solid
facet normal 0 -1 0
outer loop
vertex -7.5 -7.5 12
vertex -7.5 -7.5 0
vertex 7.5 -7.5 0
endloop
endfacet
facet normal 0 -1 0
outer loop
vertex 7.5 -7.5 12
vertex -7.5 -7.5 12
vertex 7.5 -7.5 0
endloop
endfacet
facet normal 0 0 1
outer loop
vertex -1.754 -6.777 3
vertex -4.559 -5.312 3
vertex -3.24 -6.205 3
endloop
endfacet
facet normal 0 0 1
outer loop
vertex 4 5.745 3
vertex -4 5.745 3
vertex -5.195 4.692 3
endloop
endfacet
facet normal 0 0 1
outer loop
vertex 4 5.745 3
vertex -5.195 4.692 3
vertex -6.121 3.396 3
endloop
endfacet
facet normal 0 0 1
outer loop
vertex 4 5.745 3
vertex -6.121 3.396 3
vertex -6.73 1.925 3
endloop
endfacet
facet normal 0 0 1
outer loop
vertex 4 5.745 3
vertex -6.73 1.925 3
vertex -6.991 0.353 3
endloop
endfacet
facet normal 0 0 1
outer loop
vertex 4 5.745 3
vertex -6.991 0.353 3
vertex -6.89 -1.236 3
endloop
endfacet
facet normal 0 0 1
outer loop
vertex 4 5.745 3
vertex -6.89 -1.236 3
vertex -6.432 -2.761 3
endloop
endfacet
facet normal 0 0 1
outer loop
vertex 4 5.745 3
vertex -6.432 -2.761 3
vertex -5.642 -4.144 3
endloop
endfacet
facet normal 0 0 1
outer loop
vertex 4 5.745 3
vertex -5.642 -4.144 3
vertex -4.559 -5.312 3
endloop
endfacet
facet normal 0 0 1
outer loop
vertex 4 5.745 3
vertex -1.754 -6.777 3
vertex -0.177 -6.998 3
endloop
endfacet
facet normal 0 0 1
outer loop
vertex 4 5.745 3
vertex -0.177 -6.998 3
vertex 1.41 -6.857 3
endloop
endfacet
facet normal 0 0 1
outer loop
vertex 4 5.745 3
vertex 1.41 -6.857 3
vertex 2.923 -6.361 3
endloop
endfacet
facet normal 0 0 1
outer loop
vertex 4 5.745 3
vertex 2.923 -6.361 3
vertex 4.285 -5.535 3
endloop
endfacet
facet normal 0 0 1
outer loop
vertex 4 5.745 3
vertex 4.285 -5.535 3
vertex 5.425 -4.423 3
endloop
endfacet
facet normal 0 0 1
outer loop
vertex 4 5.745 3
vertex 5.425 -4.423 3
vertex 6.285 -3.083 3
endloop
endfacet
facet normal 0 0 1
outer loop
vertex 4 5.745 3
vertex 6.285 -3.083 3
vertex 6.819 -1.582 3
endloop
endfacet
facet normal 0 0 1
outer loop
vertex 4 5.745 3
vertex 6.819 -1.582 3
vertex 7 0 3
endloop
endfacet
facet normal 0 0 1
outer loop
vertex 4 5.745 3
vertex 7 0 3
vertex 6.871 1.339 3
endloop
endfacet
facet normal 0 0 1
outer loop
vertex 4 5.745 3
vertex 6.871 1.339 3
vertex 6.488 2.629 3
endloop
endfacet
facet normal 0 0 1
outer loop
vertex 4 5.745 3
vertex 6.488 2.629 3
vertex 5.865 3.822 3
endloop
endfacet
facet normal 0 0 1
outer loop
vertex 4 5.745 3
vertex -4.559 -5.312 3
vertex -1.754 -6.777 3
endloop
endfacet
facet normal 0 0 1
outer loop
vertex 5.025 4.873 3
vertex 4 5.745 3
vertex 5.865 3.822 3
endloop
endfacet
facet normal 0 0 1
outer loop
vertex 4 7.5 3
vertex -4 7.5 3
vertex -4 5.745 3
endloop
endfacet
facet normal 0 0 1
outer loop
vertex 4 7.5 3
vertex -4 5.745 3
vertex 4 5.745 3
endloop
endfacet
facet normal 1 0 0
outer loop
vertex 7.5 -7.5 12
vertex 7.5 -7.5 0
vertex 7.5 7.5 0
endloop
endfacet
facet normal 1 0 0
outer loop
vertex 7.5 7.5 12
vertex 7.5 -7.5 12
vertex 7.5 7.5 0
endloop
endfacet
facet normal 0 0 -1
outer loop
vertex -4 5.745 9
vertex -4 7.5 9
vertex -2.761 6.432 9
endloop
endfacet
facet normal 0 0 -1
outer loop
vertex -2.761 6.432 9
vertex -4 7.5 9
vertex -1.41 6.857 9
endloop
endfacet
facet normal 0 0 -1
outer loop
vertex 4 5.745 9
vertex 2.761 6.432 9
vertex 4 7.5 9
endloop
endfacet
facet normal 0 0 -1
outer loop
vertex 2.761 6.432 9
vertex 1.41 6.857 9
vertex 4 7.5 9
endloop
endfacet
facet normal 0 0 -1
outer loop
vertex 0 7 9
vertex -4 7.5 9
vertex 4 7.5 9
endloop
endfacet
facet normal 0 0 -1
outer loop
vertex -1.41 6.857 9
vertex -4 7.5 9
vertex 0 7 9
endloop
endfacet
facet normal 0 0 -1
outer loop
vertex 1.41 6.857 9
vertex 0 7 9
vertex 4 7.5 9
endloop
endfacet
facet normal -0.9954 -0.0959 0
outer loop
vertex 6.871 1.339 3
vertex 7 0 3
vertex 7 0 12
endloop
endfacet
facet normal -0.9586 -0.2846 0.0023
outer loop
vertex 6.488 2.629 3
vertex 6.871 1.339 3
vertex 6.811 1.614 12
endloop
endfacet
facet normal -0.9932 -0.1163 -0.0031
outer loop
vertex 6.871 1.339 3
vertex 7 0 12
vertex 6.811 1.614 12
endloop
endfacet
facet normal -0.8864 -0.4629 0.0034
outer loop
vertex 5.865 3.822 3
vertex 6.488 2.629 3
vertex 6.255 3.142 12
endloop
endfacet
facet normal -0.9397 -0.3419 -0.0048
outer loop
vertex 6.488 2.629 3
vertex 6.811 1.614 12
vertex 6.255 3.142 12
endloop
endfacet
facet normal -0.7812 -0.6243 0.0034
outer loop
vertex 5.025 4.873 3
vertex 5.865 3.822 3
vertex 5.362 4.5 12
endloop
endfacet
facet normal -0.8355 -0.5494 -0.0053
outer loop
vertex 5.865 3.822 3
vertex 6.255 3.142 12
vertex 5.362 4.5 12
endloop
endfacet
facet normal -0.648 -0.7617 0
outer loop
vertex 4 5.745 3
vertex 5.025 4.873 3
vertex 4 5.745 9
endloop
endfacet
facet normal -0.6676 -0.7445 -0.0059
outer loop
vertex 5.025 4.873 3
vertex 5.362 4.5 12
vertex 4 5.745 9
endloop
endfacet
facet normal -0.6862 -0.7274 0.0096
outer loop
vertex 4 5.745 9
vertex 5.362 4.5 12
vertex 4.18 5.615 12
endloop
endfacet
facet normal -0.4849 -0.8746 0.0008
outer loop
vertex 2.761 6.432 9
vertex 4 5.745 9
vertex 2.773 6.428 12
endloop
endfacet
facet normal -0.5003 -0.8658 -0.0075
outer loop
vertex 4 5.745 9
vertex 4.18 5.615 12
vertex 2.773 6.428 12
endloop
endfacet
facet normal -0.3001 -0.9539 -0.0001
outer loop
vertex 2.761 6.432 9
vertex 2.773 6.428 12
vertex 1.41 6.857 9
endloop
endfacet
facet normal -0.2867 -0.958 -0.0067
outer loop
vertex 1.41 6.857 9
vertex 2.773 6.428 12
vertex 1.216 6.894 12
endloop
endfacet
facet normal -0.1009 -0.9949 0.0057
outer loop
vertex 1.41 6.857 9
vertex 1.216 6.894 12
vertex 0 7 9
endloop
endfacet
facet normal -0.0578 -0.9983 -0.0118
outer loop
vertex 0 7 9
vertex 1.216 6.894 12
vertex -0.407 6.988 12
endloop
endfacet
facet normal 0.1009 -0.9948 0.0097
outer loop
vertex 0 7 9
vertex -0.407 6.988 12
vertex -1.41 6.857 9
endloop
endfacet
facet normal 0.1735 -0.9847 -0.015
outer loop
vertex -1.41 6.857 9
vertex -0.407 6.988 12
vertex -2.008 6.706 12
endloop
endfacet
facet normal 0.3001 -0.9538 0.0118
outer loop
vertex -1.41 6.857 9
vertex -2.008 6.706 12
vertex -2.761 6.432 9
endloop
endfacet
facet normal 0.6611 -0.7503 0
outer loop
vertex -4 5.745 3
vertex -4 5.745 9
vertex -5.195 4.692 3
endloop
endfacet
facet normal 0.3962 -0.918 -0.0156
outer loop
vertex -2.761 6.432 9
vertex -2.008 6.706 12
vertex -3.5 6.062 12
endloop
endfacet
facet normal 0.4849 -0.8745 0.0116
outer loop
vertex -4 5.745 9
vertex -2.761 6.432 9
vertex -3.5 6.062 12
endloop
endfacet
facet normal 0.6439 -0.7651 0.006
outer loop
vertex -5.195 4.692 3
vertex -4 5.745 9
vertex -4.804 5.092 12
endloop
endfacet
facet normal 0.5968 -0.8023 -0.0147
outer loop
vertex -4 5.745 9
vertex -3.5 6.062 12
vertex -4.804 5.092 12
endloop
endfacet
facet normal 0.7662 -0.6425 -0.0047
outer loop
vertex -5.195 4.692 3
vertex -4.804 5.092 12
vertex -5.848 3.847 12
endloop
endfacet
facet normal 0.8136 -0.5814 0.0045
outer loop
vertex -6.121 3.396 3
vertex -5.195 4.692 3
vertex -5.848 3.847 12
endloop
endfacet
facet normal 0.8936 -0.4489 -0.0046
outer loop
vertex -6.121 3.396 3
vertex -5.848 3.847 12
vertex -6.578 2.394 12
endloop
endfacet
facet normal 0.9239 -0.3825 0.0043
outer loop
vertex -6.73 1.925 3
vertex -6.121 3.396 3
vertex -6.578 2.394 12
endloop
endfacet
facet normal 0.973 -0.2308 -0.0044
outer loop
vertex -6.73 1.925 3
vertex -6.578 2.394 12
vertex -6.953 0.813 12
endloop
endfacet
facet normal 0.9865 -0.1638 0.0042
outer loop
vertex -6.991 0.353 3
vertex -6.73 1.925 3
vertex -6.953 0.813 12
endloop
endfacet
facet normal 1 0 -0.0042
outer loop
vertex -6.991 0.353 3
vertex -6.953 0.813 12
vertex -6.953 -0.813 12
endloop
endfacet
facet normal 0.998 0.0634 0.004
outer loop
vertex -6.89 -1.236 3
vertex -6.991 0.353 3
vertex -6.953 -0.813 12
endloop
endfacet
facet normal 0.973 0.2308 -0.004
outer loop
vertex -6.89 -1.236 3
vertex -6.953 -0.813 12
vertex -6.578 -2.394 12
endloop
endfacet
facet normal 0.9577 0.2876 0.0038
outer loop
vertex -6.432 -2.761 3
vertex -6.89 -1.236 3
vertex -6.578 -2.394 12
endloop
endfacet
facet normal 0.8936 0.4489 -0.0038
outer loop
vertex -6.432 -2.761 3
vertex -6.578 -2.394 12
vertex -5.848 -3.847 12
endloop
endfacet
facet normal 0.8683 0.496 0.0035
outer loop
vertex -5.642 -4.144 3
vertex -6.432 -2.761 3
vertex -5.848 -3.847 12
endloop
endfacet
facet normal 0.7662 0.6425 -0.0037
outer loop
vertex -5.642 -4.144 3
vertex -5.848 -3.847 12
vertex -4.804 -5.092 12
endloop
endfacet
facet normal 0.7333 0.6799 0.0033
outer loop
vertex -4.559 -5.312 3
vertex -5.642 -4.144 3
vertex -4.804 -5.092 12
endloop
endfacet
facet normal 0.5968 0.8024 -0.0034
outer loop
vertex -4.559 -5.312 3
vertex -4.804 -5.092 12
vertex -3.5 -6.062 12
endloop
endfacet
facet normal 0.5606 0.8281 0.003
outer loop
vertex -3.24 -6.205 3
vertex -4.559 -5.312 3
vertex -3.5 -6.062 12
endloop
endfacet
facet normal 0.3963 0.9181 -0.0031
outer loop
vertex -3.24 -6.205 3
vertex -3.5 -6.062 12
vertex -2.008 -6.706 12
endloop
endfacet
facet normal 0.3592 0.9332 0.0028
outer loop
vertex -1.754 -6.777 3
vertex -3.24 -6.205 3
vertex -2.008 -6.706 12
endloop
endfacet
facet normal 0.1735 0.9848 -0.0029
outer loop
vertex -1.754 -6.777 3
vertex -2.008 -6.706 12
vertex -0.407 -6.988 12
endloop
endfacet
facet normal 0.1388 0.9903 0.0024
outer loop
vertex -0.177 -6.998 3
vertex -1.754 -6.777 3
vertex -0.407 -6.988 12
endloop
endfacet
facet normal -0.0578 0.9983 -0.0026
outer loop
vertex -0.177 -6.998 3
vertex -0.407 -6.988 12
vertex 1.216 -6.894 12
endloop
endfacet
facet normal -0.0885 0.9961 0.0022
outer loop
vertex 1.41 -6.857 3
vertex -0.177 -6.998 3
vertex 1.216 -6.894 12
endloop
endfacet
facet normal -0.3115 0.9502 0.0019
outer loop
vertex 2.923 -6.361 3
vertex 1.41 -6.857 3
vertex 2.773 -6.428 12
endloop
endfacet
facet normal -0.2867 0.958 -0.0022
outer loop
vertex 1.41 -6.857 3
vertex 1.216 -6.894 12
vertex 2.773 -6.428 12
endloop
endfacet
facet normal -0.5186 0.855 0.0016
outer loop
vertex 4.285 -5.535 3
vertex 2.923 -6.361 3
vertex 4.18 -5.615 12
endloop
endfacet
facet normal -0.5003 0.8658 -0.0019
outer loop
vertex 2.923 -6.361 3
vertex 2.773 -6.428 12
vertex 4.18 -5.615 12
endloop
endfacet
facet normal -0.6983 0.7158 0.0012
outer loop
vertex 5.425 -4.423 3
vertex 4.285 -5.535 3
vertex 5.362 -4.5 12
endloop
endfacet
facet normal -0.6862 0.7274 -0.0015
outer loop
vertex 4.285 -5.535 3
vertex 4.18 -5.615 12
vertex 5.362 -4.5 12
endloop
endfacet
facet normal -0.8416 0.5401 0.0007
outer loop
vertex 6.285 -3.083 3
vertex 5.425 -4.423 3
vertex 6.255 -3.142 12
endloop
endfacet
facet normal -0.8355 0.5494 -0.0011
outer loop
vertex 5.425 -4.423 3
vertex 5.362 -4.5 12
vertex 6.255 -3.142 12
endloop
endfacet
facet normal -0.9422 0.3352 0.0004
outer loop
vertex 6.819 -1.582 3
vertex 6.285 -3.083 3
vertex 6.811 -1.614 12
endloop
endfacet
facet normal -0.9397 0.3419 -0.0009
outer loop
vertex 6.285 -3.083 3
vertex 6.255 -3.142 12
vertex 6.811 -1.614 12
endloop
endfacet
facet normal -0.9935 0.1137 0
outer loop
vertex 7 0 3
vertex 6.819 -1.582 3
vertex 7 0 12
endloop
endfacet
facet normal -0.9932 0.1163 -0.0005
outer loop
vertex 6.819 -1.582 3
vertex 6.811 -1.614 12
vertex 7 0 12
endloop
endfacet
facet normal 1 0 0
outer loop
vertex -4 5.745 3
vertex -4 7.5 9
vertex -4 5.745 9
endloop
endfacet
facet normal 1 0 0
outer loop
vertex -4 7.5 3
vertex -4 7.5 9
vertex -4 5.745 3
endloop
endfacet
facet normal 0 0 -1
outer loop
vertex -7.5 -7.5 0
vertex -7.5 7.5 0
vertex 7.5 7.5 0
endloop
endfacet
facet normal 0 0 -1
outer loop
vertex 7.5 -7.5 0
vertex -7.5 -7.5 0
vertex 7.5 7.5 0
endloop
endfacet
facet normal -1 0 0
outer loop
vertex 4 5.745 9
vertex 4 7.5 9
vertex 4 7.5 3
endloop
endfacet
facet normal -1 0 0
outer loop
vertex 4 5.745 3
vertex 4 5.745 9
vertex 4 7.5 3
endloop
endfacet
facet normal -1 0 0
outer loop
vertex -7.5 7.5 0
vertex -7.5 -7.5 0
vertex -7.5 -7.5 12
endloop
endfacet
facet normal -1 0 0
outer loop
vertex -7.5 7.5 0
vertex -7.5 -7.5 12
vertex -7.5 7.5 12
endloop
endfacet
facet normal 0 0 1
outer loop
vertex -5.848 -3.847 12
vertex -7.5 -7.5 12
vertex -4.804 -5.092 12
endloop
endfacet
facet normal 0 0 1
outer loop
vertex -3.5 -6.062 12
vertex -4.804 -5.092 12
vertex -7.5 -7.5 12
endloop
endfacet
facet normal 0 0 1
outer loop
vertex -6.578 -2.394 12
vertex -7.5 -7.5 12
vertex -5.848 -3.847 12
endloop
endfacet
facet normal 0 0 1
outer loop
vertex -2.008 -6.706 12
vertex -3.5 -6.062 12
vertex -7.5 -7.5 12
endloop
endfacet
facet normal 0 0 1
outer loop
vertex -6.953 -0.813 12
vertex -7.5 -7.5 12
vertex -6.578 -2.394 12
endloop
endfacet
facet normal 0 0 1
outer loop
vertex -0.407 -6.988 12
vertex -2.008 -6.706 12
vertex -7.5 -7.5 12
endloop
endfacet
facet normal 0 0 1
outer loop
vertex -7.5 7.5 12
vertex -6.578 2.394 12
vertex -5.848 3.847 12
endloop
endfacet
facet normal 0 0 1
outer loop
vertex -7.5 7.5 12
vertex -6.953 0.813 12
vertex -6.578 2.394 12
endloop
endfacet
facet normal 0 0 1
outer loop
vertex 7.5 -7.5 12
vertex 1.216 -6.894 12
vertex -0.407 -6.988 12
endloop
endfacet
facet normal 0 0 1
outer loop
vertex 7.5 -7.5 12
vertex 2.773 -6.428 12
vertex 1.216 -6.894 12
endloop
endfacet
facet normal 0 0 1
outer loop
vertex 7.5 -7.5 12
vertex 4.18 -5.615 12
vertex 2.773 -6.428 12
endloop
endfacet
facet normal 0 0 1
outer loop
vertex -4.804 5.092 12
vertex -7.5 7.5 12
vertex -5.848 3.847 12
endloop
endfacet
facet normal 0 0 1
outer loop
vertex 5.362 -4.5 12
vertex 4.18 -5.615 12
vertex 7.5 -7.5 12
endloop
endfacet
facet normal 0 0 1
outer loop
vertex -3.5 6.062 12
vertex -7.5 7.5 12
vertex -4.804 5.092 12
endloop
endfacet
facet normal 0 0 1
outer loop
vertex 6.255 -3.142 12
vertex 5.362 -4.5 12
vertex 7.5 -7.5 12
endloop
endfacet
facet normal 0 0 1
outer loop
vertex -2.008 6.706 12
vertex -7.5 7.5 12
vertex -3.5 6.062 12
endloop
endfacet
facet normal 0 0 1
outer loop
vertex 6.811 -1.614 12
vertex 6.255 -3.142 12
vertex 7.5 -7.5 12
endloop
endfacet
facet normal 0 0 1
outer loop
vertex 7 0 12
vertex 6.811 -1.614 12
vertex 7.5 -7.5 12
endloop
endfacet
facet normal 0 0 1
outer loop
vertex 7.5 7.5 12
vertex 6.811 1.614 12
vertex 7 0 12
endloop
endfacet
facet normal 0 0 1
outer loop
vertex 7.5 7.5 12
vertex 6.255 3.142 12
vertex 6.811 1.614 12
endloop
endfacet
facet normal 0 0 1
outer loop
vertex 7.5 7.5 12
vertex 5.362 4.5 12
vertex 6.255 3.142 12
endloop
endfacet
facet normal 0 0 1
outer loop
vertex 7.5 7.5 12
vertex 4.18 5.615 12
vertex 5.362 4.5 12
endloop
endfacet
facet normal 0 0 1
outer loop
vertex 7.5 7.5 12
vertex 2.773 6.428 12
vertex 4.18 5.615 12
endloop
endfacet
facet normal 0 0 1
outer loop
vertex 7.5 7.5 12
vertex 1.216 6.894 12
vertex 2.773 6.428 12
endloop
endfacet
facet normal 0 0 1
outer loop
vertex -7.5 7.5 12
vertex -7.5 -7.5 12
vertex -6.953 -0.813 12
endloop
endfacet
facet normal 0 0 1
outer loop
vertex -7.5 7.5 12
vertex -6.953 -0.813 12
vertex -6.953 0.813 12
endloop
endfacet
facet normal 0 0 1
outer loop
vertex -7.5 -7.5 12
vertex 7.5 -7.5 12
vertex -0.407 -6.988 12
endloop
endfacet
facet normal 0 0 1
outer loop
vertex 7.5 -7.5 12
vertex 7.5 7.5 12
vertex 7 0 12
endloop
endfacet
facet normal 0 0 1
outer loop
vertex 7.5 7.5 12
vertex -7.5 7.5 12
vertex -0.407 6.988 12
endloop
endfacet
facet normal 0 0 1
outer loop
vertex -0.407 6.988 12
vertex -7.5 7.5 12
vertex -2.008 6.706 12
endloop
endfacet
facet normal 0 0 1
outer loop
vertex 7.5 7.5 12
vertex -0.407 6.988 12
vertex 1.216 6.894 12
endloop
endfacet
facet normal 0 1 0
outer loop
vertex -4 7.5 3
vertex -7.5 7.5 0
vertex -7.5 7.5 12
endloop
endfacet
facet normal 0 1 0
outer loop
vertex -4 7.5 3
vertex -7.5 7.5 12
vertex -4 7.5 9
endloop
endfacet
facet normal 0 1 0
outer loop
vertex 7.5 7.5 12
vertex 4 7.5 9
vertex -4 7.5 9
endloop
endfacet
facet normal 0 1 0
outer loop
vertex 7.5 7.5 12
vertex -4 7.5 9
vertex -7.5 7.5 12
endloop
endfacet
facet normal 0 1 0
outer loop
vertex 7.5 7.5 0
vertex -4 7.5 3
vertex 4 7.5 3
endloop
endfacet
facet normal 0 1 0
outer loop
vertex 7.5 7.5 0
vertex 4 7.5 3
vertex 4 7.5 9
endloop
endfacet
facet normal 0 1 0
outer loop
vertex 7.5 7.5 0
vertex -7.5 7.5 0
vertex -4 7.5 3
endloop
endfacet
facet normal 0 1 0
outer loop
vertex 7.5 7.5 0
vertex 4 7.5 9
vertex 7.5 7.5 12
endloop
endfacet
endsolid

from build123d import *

# Parameters (mm, degrees)
CROQUIS1_W              = 15
CROQUIS1_H              = 15
SALIENTE_EXTRUIR1_DEPTH = 12
CROQUIS2_W              = 8
CROQUIS2_H              = 6
CORTAR_EXTRUIR1_DEPTH   = 10
CROQUIS3_R              = 7
CORTAR_EXTRUIR2_DEPTH   = 9


with BuildPart() as part:
    # Croquis1 → Saliente-Extruir1 (new body)
    with BuildSketch(Plane.XY):
        Rectangle(CROQUIS1_W, CROQUIS1_H)
    extrude(amount=SALIENTE_EXTRUIR1_DEPTH)

    # Croquis2 → Cortar-Extruir1 (cut)
    with BuildSketch(Plane(origin=(0, 7.5, 0), x_dir=(1, 0, 0), z_dir=(0, 1, 0))):
        with Locations((0, -6)):
            Rectangle(CROQUIS2_W, CROQUIS2_H)
    extrude(amount=-CORTAR_EXTRUIR1_DEPTH, mode=Mode.SUBTRACT)

    # Croquis3 → Cortar-Extruir2 (cut)
    with BuildSketch(Plane.XY.offset(12)):
        Circle(CROQUIS3_R)
    extrude(amount=-CORTAR_EXTRUIR2_DEPTH, mode=Mode.SUBTRACT)


solid = part.part
